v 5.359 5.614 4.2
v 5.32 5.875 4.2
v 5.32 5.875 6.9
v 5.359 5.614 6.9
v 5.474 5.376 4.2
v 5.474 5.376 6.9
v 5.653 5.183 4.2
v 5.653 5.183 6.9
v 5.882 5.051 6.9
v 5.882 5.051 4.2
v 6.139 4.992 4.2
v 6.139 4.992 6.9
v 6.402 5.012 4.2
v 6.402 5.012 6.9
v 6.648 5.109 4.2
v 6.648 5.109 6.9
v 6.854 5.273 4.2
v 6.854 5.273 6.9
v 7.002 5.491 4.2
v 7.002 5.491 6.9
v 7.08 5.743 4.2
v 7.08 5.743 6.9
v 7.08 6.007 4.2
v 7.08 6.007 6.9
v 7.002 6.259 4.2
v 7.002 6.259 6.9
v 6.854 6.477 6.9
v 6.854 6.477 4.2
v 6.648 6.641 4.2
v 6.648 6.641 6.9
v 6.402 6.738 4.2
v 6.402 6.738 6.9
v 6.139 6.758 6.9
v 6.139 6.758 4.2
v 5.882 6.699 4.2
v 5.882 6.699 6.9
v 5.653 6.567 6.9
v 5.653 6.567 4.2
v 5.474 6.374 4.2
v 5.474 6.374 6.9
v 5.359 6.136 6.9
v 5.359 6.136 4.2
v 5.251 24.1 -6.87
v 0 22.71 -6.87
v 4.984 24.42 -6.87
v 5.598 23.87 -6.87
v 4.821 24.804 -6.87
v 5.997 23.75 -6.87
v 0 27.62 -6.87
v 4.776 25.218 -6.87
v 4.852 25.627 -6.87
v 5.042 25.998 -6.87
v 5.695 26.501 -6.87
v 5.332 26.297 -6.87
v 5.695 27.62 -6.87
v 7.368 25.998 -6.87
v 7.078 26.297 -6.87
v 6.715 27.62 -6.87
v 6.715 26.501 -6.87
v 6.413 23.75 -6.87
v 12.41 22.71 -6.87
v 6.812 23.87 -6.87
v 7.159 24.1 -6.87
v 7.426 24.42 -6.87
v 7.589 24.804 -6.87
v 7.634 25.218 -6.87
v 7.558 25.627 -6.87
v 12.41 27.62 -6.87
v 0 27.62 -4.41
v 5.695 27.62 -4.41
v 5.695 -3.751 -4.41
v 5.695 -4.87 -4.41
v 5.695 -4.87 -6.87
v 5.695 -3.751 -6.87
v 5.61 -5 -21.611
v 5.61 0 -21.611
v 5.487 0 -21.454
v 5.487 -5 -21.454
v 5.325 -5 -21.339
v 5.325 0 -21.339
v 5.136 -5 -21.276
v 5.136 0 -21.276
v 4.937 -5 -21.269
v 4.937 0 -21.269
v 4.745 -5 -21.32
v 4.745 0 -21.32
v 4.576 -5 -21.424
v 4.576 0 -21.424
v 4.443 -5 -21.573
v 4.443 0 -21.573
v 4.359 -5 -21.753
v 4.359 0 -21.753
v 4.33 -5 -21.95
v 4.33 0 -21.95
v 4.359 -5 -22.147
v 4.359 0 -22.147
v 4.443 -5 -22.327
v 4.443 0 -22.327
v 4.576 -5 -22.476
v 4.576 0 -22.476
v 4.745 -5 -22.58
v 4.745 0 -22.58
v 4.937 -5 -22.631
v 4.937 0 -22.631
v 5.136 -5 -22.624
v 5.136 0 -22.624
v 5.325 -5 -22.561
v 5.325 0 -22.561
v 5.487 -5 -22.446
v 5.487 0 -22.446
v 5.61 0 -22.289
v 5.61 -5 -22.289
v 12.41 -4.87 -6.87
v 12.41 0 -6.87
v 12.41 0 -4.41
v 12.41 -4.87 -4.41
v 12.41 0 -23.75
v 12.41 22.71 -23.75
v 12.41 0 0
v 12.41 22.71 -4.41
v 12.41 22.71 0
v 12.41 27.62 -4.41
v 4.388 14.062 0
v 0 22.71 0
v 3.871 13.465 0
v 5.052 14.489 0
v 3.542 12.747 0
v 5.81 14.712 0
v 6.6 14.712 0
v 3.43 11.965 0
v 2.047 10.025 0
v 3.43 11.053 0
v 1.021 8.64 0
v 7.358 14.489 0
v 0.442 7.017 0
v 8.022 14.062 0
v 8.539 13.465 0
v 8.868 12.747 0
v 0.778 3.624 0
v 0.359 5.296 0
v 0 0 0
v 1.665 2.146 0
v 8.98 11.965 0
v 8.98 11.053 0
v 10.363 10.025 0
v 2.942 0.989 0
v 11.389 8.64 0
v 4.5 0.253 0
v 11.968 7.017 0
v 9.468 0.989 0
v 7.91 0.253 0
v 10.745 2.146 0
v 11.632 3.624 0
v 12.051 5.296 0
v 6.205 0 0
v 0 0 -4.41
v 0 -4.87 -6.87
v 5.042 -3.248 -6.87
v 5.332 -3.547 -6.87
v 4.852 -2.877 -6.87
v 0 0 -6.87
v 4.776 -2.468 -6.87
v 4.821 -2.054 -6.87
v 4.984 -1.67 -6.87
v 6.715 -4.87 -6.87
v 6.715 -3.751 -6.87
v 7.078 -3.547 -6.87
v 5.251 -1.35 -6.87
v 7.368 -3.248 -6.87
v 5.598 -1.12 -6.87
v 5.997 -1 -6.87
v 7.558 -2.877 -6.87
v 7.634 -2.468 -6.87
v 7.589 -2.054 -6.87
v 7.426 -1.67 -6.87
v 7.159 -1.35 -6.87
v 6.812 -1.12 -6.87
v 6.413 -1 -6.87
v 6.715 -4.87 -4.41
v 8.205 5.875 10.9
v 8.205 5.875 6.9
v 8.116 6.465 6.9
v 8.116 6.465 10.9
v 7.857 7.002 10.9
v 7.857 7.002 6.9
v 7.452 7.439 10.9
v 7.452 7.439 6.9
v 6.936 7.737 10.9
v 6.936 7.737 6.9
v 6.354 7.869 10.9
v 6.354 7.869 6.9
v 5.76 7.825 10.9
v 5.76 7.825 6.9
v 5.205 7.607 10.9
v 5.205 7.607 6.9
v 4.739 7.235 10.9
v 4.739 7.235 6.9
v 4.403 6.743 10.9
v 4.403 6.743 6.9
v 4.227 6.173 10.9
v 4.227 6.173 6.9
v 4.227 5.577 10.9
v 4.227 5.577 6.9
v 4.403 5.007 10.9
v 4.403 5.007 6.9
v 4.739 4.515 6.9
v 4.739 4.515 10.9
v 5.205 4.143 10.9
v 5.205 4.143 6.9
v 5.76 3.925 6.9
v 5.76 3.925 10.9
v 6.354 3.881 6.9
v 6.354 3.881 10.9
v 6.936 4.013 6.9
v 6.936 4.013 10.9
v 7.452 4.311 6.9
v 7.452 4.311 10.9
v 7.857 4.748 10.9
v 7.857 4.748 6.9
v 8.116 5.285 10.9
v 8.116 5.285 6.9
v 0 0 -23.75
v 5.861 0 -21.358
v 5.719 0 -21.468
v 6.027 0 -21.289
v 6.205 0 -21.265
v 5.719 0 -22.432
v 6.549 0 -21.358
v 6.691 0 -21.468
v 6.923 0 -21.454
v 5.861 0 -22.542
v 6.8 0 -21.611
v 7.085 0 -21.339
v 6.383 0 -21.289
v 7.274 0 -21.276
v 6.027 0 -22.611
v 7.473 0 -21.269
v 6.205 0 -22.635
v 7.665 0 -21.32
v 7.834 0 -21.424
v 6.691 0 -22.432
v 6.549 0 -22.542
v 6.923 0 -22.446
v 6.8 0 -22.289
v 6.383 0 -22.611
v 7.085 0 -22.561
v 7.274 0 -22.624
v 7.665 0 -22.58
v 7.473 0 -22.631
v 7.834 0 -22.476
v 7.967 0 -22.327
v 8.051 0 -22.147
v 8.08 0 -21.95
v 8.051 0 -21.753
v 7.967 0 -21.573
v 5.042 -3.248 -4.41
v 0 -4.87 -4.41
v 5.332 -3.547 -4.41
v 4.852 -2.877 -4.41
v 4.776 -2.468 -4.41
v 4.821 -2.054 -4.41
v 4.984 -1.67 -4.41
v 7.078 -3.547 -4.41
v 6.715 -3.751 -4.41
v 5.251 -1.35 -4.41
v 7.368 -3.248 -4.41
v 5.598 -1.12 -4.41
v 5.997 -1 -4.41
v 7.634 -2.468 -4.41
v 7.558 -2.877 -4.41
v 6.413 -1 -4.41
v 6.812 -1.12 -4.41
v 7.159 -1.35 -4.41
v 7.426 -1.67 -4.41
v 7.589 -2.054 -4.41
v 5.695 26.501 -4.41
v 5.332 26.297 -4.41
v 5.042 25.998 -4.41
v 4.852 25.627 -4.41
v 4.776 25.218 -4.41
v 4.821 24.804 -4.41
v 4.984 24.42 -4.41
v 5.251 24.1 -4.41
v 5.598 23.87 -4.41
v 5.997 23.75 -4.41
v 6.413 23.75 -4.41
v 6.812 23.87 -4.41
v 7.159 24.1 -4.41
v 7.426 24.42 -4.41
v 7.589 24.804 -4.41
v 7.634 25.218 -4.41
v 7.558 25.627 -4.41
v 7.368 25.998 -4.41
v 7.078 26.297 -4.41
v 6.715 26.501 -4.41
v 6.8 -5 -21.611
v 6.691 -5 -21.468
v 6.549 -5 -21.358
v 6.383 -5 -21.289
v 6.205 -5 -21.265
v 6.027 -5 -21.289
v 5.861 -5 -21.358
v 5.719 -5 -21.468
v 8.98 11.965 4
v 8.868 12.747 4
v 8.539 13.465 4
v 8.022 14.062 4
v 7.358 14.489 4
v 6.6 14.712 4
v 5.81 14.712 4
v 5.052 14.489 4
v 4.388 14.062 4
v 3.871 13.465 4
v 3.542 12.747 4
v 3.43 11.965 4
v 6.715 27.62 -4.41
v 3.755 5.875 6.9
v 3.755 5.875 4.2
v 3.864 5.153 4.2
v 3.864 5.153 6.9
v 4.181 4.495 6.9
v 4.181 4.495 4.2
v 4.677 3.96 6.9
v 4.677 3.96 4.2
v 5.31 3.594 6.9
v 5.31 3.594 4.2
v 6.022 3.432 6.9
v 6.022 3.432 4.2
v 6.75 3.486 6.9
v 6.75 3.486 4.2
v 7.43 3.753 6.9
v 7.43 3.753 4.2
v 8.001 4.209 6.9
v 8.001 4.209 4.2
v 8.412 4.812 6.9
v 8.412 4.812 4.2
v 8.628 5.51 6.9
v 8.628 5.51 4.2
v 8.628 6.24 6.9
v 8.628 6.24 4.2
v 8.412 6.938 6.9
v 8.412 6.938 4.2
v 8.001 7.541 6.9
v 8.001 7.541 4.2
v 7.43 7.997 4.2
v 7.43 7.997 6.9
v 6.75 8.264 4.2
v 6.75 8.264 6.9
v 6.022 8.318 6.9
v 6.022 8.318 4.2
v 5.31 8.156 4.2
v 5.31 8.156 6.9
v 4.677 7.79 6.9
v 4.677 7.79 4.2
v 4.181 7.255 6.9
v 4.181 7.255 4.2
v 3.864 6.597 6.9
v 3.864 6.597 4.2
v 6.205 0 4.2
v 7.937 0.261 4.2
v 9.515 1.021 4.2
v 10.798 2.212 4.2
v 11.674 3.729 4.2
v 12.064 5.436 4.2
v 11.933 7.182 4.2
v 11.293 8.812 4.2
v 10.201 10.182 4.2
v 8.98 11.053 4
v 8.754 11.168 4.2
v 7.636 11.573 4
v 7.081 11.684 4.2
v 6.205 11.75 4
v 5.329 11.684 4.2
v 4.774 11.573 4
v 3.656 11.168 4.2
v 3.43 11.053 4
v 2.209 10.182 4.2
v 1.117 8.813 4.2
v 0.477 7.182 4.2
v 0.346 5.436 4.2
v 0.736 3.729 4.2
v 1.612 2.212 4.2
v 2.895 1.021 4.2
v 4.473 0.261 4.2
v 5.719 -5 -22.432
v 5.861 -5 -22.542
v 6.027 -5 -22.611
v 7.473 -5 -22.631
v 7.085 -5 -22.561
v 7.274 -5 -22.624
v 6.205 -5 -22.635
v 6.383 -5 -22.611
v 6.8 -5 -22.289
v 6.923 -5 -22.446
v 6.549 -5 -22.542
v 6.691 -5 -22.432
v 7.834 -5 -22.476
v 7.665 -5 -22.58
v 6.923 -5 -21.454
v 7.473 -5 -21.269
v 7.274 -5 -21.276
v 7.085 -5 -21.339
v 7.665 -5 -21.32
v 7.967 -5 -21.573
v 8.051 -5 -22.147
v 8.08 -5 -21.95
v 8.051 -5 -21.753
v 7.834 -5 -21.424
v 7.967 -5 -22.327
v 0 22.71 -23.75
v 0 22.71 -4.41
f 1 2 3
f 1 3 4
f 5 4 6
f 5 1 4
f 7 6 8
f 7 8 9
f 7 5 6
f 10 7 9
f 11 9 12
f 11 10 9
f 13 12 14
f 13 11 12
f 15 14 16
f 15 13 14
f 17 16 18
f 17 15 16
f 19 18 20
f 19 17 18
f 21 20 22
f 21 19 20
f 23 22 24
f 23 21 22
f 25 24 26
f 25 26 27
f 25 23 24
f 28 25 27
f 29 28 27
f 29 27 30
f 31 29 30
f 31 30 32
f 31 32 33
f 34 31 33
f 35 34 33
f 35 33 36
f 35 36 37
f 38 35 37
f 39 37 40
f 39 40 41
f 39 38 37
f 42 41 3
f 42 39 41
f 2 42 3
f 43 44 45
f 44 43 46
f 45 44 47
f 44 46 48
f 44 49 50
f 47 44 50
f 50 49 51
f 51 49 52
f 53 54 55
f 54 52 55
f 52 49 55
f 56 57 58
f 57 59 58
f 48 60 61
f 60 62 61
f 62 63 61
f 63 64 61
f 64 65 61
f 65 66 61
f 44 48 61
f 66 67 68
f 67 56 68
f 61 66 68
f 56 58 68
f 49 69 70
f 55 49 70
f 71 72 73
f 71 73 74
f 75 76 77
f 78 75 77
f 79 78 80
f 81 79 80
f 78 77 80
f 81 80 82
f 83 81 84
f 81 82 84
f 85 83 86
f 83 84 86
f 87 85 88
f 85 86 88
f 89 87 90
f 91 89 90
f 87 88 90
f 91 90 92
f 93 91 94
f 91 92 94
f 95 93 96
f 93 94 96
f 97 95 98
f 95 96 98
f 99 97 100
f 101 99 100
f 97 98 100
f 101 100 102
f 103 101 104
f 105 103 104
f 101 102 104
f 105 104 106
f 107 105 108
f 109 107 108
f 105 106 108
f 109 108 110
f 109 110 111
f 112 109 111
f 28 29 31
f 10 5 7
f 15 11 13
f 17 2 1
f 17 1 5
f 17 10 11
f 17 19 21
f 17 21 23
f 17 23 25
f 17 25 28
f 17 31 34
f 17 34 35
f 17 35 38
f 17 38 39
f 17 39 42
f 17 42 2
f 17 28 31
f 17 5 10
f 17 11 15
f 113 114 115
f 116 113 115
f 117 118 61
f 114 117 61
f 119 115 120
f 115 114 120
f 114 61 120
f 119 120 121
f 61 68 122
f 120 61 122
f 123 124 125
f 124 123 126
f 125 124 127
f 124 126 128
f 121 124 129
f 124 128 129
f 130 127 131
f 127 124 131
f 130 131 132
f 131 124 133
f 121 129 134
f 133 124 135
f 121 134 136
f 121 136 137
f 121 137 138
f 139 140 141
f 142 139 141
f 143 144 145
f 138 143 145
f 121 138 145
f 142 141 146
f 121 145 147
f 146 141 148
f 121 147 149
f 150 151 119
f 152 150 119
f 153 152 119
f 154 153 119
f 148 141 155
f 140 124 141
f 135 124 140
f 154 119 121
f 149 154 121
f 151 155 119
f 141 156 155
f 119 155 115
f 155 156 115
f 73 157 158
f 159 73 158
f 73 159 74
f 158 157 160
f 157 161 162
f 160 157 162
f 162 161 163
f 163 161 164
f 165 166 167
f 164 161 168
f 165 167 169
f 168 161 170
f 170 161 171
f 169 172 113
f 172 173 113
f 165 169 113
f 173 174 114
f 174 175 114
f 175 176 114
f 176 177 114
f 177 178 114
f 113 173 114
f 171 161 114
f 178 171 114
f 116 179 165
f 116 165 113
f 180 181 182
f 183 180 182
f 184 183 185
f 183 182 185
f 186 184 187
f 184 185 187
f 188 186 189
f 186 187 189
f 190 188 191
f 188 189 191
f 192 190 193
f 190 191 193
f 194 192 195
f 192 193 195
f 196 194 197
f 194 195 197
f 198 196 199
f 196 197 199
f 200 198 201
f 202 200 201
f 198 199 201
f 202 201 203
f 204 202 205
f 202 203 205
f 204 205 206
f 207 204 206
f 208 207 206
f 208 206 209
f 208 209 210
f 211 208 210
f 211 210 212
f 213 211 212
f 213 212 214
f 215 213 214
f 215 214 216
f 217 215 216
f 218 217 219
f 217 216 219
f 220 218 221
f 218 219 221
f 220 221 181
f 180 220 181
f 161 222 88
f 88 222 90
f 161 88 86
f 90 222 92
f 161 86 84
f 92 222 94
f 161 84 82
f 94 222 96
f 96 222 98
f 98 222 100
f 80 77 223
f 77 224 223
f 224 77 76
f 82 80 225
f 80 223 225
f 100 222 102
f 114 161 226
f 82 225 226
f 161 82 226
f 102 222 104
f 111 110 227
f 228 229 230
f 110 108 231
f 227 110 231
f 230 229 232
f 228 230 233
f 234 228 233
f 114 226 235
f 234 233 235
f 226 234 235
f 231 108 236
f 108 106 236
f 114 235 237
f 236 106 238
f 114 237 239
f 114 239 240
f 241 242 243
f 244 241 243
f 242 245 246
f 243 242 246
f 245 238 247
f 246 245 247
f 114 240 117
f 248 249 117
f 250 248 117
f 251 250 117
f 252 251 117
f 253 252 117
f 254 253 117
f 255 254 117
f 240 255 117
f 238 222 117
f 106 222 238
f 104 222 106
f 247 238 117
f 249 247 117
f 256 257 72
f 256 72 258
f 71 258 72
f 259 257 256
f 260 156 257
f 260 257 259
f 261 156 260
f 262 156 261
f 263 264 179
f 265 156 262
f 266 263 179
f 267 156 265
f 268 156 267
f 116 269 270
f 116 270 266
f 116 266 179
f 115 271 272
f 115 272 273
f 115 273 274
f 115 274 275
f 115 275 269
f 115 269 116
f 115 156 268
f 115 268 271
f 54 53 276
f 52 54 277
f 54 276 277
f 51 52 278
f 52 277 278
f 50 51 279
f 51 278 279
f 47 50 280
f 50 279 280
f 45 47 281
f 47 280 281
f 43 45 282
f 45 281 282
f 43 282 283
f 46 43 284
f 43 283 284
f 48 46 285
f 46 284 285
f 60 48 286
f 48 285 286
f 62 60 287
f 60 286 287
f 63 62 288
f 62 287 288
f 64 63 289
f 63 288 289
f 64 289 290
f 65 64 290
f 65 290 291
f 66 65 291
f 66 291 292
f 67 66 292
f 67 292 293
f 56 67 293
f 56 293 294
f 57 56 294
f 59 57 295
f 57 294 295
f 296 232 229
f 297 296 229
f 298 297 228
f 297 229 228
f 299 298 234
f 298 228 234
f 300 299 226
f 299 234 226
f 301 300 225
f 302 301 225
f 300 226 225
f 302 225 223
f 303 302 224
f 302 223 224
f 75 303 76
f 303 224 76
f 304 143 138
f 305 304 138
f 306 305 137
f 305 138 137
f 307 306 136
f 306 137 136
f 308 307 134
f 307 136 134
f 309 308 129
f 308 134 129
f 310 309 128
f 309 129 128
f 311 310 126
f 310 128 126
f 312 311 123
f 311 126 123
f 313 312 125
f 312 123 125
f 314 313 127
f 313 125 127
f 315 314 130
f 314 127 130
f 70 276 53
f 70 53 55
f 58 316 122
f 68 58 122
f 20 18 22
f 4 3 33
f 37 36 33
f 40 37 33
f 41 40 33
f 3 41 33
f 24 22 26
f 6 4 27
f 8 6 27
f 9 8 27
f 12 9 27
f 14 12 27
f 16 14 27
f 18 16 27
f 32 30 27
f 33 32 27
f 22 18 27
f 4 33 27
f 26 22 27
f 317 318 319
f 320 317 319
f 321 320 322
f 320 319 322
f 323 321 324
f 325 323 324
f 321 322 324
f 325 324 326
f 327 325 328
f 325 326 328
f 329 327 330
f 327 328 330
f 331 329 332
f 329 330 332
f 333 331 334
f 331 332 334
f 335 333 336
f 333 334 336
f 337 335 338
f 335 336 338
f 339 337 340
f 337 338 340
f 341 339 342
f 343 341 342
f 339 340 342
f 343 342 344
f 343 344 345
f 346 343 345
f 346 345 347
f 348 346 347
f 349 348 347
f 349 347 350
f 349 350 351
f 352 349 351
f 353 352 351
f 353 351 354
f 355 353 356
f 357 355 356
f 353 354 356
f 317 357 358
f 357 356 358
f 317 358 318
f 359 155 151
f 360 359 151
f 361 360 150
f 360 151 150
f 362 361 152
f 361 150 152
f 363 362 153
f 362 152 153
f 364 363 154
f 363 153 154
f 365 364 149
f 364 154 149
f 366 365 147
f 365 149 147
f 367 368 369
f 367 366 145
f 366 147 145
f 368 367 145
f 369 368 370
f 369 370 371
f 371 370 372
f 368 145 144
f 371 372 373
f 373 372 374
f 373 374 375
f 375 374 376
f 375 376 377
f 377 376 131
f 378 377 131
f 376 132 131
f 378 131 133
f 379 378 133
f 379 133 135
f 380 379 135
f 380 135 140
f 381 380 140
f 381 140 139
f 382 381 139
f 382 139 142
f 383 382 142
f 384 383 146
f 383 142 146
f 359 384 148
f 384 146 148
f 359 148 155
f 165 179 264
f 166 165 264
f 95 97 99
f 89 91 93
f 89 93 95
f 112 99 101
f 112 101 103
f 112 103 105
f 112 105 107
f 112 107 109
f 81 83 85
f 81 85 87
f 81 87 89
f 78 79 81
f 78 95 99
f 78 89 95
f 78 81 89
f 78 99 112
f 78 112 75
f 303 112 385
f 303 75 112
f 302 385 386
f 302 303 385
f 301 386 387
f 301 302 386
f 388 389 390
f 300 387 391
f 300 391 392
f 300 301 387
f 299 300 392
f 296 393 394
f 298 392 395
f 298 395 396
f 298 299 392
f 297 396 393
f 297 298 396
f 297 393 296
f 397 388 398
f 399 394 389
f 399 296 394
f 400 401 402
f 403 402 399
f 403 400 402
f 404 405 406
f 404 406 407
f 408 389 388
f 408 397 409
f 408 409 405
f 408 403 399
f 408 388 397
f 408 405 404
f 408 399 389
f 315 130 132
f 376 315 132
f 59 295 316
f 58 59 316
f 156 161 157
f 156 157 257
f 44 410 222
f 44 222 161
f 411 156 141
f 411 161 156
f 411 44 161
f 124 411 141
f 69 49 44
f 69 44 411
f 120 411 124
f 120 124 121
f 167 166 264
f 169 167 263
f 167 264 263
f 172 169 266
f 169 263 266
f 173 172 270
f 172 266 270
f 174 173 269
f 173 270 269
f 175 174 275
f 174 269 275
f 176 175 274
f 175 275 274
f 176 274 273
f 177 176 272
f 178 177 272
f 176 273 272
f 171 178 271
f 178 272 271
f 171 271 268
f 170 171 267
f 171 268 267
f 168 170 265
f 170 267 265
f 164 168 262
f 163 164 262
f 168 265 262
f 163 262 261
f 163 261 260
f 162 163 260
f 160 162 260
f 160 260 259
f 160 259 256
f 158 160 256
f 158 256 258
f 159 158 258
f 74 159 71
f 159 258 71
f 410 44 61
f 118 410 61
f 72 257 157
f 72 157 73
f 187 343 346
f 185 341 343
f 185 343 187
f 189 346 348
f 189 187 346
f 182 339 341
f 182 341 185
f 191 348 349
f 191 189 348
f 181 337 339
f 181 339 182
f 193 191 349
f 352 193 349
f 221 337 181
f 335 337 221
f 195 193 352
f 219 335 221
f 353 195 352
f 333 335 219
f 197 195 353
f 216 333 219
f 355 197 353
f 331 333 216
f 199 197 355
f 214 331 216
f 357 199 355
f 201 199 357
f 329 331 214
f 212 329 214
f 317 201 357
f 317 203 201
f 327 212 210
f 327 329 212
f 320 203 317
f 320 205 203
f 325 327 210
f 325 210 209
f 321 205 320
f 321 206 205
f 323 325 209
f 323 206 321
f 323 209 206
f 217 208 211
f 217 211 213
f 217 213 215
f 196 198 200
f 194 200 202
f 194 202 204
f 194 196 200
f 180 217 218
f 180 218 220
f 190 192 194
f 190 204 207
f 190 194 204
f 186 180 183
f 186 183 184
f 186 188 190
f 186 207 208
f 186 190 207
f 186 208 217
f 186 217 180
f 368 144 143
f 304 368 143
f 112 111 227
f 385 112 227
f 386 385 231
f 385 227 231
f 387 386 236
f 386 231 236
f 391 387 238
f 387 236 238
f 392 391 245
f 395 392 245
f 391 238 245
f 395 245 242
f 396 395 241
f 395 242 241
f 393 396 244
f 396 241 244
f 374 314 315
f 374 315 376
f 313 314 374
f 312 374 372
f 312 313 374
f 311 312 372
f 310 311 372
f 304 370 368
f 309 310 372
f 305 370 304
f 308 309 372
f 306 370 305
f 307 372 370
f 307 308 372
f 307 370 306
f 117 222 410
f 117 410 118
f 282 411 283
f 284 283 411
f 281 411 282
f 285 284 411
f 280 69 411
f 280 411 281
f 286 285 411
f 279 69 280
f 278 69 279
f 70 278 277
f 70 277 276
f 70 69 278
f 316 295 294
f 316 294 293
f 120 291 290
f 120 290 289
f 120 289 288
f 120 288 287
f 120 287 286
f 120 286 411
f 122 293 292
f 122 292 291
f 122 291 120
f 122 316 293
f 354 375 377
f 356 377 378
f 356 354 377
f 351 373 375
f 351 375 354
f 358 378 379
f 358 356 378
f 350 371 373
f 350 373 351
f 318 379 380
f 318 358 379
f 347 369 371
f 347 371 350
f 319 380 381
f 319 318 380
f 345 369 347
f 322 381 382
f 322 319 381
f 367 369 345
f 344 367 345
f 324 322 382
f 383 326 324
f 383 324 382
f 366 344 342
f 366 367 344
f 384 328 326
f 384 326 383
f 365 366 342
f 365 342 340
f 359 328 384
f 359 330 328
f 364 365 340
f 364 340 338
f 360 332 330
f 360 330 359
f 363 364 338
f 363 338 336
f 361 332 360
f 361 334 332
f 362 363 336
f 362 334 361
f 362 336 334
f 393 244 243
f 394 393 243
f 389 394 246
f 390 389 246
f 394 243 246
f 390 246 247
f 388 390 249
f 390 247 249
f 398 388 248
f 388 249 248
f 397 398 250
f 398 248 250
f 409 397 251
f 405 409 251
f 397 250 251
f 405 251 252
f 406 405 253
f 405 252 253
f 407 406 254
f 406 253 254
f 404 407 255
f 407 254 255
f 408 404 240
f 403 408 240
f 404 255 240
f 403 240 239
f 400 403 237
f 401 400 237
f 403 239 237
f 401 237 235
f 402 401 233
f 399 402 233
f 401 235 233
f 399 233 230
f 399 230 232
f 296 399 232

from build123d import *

# Parameters (mm, degrees)
SKETCH1_W                = 12.41
SKETCH1_H                = 23.75
BOSS_EXTRUDE1_DEPTH      = 22.71
SKETCH2_R                = 5.875
BOSS_EXTRUDE3_DEPTH      = 4.2
BOSS_EXTRUDE4_DEPTH      = 4
BOSS_EXTRUDE5_DEPTH      = 4.87
BOSS_EXTRUDE5_DEPTH_BACK = 27.62
SKETCH6_W                = 12.41
SKETCH6_H                = 2.46
SKETCH8_R                = 1.43
CUT_EXTRUDE1_DEPTH       = 36.929209565
SKETCH9_W                = 1.02
SKETCH9_H                = 2.455
CUT_EXTRUDE2_DEPTH       = 36.929209565
SKETCH10_R               = 2.45
SKETCH10_R_2             = 0.885
BOSS_EXTRUDE7_DEPTH      = 2.7
BOSS_EXTRUDE8_DEPTH      = 5
SKETCH13_R               = 2
BOSS_EXTRUDE9_DEPTH      = 4


with BuildPart() as part:
    # Sketch1 → Boss-Extrude1 (new body)
    with BuildSketch(Plane(origin=(0, 0, 0), x_dir=(1, 0, 0), z_dir=(0, 1, 0))):
        with Locations((6.205, 11.875)):
            Rectangle(SKETCH1_W, SKETCH1_H)
    extrude(amount=BOSS_EXTRUDE1_DEPTH)

    # Sketch2 → Boss-Extrude3 (add)
    with BuildSketch(Plane.XY):
        with Locations((6.205, 5.875)):
            Circle(SKETCH2_R)
    extrude(amount=BOSS_EXTRUDE3_DEPTH)

    # Sketch4 → Boss-Extrude4 (add)
    with BuildSketch(Plane.XY):
        with BuildLine():
            Line((3.43, 11.965), (3.43, 11.053320191))
            Line((3.43, 11.053320191), (8.98, 11.053320191))
            Line((8.98, 11.053320191), (8.98, 11.965))
            ThreePointArc((8.98, 11.965), (6.205, 14.74), (3.43, 11.965))
        make_face()
    extrude(amount=BOSS_EXTRUDE4_DEPTH)

    # Sketch6 → Boss-Extrude5 (add, two sides: drawn at the far end of the back side and taken through both)
    with BuildSketch(Plane.XZ.offset(-BOSS_EXTRUDE5_DEPTH_BACK)):
        with Locations((6.205, -5.64)):
            Rectangle(SKETCH6_W, SKETCH6_H)
    extrude(amount=BOSS_EXTRUDE5_DEPTH + BOSS_EXTRUDE5_DEPTH_BACK)

    # Sketch8 → Cut-Extrude1 (cut, through all)
    with BuildSketch(Plane.XY.offset(-4.41)):
        with Locations((6.205, 25.165)):
            Circle(SKETCH8_R)
        with Locations((6.205, -2.415)):
            Circle(SKETCH8_R)
    extrude(amount=-CUT_EXTRUDE1_DEPTH, mode=Mode.SUBTRACT)

    # Sketch9 → Cut-Extrude2 (cut, through all)
    with BuildSketch(Plane.XY.offset(-4.41)):
        with Locations((6.205, 26.3925)):
            Rectangle(SKETCH9_W, SKETCH9_H)
        with Locations((6.205, -3.6425)):
            Rectangle(SKETCH9_W, SKETCH9_H)
    extrude(amount=-CUT_EXTRUDE2_DEPTH, mode=Mode.SUBTRACT)

    # Sketch10 → Boss-Extrude7 (add)
    with BuildSketch(Plane.XY.offset(4.2)):
        with Locations((6.205, 5.875)):
            Circle(SKETCH10_R)
        with Locations((6.205, 5.875)):
            Circle(SKETCH10_R_2, mode=Mode.SUBTRACT)
    extrude(amount=BOSS_EXTRUDE7_DEPTH)

    # Sketch12 → Boss-Extrude8 (add)
    with BuildSketch(Plane.XZ):
        with BuildLine():
            ThreePointArc((5.61, -22.289411255), (6.205, -22.635), (6.8, -22.289411255))
            ThreePointArc((6.8, -22.289411255), (8.08, -21.95), (6.8, -21.610588745))
            ThreePointArc((6.8, -21.610588745), (6.205, -21.265), (5.61, -21.610588745))
            ThreePointArc((5.61, -21.610588745), (4.33, -21.95), (5.61, -22.289411255))
        make_face()
    extrude(amount=BOSS_EXTRUDE8_DEPTH)

    # Sketch13 → Boss-Extrude9 (add)
    with BuildSketch(Plane.XY.offset(6.9)):
        with Locations((6.205, 5.875)):
            Circle(SKETCH13_R)
    extrude(amount=BOSS_EXTRUDE9_DEPTH)


solid = part.part
